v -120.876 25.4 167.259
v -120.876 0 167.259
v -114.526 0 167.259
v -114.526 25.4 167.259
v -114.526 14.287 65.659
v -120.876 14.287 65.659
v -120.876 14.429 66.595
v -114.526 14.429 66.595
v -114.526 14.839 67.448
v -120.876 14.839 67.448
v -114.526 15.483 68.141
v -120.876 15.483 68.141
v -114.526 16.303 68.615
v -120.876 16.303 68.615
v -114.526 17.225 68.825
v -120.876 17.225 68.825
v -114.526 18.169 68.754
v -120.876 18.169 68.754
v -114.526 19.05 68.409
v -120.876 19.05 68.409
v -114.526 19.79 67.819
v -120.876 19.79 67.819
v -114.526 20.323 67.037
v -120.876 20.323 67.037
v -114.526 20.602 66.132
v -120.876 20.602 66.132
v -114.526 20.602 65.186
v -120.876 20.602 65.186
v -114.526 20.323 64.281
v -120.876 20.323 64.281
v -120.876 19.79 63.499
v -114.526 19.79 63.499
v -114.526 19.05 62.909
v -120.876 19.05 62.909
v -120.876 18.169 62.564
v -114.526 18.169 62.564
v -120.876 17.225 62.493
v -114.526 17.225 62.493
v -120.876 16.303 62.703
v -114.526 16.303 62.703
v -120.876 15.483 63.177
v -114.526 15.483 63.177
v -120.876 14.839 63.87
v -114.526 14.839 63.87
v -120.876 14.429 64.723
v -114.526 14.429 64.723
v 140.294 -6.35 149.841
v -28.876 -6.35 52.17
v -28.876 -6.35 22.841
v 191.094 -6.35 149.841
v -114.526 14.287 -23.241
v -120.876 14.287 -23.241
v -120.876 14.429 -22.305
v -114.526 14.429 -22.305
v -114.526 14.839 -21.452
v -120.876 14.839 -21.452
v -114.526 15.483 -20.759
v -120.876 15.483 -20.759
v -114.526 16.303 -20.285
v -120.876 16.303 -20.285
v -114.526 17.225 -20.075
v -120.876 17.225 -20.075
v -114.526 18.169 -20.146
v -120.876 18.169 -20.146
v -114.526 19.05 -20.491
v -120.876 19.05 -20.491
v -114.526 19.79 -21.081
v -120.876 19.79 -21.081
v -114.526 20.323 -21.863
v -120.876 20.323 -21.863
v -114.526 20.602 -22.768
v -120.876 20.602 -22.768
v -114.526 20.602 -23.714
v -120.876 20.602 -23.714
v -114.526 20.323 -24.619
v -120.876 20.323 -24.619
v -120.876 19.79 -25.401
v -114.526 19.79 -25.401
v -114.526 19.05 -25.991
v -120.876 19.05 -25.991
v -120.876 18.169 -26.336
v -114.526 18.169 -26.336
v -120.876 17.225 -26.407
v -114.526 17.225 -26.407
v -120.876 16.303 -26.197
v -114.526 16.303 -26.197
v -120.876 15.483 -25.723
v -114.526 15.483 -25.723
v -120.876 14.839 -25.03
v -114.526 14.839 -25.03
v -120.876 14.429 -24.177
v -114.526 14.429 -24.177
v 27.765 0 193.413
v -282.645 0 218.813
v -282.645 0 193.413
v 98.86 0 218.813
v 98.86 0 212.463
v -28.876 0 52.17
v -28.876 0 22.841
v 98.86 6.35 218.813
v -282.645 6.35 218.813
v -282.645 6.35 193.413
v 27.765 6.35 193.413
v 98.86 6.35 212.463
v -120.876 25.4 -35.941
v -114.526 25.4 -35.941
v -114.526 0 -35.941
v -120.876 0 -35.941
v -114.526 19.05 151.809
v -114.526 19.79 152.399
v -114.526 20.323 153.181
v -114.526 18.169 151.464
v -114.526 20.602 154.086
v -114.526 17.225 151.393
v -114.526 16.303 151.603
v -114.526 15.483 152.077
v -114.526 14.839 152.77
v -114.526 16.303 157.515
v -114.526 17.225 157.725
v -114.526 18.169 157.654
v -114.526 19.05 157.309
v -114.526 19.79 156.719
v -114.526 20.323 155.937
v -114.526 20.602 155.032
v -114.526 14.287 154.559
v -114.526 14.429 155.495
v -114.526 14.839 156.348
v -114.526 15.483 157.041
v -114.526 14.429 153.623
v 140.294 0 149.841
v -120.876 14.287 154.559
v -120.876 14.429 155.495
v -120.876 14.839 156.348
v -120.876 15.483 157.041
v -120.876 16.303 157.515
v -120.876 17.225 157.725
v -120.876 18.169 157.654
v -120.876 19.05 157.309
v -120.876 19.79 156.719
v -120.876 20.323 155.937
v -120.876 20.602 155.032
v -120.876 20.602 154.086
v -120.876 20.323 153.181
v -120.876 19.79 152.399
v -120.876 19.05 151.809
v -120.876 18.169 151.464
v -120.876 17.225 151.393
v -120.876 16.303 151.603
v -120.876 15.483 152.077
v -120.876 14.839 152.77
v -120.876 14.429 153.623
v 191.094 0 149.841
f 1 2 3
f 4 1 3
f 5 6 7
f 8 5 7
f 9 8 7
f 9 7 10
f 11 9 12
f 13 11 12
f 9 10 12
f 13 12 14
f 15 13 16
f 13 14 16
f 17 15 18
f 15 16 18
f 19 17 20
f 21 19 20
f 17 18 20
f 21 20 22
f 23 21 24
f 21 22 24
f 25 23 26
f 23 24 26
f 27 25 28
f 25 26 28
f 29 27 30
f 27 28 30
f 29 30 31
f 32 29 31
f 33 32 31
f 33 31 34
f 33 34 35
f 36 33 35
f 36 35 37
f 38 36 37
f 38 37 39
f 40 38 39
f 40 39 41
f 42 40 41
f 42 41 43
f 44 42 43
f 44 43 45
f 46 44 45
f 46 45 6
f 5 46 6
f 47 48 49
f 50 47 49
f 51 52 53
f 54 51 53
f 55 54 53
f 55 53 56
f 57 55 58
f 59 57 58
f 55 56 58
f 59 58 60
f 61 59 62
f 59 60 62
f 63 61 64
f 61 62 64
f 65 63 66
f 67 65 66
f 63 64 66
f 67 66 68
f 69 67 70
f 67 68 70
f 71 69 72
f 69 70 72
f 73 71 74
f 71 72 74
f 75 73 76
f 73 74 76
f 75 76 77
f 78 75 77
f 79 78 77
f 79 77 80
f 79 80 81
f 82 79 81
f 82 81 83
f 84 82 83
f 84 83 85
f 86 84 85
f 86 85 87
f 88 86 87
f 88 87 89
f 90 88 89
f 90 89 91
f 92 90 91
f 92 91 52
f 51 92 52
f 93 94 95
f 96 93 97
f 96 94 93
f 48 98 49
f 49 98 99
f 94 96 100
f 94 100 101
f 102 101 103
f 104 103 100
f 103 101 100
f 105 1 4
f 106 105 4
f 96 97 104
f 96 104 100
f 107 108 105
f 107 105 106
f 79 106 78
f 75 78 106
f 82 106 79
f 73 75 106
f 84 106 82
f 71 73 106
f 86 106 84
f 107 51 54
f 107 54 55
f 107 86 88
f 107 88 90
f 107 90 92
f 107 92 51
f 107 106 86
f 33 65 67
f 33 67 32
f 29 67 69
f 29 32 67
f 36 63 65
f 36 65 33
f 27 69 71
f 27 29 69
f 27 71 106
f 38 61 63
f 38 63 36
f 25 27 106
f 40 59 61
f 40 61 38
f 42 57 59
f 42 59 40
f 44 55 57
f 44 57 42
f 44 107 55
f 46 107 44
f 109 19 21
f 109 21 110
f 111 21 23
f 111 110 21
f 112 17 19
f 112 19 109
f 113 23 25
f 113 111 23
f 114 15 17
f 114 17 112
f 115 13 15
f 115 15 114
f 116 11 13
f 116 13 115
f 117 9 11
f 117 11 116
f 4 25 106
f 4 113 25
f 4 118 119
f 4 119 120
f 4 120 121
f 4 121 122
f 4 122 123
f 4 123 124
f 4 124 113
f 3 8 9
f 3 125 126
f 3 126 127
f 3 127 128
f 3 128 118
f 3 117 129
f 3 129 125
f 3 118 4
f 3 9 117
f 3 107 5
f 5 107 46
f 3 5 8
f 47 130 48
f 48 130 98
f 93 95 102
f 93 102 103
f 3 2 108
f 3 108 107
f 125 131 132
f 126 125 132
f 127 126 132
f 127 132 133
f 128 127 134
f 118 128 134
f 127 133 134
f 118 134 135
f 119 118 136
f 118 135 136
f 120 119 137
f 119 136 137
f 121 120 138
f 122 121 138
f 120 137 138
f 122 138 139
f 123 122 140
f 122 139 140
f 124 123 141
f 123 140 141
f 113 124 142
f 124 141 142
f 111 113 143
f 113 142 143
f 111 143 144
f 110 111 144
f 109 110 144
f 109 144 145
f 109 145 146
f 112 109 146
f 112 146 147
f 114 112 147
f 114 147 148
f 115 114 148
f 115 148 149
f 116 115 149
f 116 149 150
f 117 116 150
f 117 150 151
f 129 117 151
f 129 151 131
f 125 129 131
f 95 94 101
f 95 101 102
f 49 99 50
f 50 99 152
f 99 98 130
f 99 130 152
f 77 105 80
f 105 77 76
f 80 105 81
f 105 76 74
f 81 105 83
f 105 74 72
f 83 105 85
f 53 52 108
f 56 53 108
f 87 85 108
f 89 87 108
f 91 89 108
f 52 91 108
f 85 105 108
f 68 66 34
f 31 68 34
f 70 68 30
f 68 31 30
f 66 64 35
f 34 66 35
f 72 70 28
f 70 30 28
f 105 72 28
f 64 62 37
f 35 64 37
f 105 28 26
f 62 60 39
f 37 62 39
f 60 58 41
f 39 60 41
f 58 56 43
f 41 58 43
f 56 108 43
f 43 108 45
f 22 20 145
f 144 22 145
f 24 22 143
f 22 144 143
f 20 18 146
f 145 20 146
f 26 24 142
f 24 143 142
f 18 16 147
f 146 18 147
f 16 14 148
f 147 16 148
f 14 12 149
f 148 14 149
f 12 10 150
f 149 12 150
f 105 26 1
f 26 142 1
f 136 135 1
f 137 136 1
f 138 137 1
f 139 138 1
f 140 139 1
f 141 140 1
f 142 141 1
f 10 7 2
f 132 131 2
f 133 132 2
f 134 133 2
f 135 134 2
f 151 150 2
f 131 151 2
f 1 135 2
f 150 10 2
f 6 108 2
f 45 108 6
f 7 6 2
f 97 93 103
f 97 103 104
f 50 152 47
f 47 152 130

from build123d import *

# Parameters (mm, degrees)
F0_W     = 6.35
F0_H     = 203.2
F2_DEPTH = 25.4
F4_D     = 6.35
F6_DEPTH = 6.35
F8_DEPTH = 6.35


with BuildPart() as f2:
    # F0 (on Front) → F2 (new body)
    with BuildSketch(Plane.XZ):
        with Locations((-117.700584, 65.658997)):
            Rectangle(F0_W, F0_H)
    extrude(amount=-F2_DEPTH)

    # F4 (through all)
    with Locations(Plane.YZ.offset(-114.525584)):
        with Locations((17.4625, 154.558997), (17.4625, 65.658997), (17.4625, -23.241003)):
            Hole(F4_D / 2)


with BuildPart() as f6:
    # F5 (on face) → F6 (new body)
    with BuildSketch(Plane.XZ):
        Polygon((98.860206, 218.812712), (-282.64546, 218.812712), (-282.64546, 193.412712), (27.764638, 193.412712), (98.860206, 212.462712), align=None)
    extrude(amount=-F6_DEPTH)


with BuildPart() as f8:
    # F7 (on face) → F8 (new body)
    with BuildSketch(Plane.XZ):
        Polygon((140.294248, 149.840915), (-28.876204, 52.170309), (-28.876204, 22.840915), (191.094248, 149.840915), (148.710795, 149.840915), align=None)
    extrude(amount=F8_DEPTH)


solid = Compound([f2.part, f6.part, f8.part])
